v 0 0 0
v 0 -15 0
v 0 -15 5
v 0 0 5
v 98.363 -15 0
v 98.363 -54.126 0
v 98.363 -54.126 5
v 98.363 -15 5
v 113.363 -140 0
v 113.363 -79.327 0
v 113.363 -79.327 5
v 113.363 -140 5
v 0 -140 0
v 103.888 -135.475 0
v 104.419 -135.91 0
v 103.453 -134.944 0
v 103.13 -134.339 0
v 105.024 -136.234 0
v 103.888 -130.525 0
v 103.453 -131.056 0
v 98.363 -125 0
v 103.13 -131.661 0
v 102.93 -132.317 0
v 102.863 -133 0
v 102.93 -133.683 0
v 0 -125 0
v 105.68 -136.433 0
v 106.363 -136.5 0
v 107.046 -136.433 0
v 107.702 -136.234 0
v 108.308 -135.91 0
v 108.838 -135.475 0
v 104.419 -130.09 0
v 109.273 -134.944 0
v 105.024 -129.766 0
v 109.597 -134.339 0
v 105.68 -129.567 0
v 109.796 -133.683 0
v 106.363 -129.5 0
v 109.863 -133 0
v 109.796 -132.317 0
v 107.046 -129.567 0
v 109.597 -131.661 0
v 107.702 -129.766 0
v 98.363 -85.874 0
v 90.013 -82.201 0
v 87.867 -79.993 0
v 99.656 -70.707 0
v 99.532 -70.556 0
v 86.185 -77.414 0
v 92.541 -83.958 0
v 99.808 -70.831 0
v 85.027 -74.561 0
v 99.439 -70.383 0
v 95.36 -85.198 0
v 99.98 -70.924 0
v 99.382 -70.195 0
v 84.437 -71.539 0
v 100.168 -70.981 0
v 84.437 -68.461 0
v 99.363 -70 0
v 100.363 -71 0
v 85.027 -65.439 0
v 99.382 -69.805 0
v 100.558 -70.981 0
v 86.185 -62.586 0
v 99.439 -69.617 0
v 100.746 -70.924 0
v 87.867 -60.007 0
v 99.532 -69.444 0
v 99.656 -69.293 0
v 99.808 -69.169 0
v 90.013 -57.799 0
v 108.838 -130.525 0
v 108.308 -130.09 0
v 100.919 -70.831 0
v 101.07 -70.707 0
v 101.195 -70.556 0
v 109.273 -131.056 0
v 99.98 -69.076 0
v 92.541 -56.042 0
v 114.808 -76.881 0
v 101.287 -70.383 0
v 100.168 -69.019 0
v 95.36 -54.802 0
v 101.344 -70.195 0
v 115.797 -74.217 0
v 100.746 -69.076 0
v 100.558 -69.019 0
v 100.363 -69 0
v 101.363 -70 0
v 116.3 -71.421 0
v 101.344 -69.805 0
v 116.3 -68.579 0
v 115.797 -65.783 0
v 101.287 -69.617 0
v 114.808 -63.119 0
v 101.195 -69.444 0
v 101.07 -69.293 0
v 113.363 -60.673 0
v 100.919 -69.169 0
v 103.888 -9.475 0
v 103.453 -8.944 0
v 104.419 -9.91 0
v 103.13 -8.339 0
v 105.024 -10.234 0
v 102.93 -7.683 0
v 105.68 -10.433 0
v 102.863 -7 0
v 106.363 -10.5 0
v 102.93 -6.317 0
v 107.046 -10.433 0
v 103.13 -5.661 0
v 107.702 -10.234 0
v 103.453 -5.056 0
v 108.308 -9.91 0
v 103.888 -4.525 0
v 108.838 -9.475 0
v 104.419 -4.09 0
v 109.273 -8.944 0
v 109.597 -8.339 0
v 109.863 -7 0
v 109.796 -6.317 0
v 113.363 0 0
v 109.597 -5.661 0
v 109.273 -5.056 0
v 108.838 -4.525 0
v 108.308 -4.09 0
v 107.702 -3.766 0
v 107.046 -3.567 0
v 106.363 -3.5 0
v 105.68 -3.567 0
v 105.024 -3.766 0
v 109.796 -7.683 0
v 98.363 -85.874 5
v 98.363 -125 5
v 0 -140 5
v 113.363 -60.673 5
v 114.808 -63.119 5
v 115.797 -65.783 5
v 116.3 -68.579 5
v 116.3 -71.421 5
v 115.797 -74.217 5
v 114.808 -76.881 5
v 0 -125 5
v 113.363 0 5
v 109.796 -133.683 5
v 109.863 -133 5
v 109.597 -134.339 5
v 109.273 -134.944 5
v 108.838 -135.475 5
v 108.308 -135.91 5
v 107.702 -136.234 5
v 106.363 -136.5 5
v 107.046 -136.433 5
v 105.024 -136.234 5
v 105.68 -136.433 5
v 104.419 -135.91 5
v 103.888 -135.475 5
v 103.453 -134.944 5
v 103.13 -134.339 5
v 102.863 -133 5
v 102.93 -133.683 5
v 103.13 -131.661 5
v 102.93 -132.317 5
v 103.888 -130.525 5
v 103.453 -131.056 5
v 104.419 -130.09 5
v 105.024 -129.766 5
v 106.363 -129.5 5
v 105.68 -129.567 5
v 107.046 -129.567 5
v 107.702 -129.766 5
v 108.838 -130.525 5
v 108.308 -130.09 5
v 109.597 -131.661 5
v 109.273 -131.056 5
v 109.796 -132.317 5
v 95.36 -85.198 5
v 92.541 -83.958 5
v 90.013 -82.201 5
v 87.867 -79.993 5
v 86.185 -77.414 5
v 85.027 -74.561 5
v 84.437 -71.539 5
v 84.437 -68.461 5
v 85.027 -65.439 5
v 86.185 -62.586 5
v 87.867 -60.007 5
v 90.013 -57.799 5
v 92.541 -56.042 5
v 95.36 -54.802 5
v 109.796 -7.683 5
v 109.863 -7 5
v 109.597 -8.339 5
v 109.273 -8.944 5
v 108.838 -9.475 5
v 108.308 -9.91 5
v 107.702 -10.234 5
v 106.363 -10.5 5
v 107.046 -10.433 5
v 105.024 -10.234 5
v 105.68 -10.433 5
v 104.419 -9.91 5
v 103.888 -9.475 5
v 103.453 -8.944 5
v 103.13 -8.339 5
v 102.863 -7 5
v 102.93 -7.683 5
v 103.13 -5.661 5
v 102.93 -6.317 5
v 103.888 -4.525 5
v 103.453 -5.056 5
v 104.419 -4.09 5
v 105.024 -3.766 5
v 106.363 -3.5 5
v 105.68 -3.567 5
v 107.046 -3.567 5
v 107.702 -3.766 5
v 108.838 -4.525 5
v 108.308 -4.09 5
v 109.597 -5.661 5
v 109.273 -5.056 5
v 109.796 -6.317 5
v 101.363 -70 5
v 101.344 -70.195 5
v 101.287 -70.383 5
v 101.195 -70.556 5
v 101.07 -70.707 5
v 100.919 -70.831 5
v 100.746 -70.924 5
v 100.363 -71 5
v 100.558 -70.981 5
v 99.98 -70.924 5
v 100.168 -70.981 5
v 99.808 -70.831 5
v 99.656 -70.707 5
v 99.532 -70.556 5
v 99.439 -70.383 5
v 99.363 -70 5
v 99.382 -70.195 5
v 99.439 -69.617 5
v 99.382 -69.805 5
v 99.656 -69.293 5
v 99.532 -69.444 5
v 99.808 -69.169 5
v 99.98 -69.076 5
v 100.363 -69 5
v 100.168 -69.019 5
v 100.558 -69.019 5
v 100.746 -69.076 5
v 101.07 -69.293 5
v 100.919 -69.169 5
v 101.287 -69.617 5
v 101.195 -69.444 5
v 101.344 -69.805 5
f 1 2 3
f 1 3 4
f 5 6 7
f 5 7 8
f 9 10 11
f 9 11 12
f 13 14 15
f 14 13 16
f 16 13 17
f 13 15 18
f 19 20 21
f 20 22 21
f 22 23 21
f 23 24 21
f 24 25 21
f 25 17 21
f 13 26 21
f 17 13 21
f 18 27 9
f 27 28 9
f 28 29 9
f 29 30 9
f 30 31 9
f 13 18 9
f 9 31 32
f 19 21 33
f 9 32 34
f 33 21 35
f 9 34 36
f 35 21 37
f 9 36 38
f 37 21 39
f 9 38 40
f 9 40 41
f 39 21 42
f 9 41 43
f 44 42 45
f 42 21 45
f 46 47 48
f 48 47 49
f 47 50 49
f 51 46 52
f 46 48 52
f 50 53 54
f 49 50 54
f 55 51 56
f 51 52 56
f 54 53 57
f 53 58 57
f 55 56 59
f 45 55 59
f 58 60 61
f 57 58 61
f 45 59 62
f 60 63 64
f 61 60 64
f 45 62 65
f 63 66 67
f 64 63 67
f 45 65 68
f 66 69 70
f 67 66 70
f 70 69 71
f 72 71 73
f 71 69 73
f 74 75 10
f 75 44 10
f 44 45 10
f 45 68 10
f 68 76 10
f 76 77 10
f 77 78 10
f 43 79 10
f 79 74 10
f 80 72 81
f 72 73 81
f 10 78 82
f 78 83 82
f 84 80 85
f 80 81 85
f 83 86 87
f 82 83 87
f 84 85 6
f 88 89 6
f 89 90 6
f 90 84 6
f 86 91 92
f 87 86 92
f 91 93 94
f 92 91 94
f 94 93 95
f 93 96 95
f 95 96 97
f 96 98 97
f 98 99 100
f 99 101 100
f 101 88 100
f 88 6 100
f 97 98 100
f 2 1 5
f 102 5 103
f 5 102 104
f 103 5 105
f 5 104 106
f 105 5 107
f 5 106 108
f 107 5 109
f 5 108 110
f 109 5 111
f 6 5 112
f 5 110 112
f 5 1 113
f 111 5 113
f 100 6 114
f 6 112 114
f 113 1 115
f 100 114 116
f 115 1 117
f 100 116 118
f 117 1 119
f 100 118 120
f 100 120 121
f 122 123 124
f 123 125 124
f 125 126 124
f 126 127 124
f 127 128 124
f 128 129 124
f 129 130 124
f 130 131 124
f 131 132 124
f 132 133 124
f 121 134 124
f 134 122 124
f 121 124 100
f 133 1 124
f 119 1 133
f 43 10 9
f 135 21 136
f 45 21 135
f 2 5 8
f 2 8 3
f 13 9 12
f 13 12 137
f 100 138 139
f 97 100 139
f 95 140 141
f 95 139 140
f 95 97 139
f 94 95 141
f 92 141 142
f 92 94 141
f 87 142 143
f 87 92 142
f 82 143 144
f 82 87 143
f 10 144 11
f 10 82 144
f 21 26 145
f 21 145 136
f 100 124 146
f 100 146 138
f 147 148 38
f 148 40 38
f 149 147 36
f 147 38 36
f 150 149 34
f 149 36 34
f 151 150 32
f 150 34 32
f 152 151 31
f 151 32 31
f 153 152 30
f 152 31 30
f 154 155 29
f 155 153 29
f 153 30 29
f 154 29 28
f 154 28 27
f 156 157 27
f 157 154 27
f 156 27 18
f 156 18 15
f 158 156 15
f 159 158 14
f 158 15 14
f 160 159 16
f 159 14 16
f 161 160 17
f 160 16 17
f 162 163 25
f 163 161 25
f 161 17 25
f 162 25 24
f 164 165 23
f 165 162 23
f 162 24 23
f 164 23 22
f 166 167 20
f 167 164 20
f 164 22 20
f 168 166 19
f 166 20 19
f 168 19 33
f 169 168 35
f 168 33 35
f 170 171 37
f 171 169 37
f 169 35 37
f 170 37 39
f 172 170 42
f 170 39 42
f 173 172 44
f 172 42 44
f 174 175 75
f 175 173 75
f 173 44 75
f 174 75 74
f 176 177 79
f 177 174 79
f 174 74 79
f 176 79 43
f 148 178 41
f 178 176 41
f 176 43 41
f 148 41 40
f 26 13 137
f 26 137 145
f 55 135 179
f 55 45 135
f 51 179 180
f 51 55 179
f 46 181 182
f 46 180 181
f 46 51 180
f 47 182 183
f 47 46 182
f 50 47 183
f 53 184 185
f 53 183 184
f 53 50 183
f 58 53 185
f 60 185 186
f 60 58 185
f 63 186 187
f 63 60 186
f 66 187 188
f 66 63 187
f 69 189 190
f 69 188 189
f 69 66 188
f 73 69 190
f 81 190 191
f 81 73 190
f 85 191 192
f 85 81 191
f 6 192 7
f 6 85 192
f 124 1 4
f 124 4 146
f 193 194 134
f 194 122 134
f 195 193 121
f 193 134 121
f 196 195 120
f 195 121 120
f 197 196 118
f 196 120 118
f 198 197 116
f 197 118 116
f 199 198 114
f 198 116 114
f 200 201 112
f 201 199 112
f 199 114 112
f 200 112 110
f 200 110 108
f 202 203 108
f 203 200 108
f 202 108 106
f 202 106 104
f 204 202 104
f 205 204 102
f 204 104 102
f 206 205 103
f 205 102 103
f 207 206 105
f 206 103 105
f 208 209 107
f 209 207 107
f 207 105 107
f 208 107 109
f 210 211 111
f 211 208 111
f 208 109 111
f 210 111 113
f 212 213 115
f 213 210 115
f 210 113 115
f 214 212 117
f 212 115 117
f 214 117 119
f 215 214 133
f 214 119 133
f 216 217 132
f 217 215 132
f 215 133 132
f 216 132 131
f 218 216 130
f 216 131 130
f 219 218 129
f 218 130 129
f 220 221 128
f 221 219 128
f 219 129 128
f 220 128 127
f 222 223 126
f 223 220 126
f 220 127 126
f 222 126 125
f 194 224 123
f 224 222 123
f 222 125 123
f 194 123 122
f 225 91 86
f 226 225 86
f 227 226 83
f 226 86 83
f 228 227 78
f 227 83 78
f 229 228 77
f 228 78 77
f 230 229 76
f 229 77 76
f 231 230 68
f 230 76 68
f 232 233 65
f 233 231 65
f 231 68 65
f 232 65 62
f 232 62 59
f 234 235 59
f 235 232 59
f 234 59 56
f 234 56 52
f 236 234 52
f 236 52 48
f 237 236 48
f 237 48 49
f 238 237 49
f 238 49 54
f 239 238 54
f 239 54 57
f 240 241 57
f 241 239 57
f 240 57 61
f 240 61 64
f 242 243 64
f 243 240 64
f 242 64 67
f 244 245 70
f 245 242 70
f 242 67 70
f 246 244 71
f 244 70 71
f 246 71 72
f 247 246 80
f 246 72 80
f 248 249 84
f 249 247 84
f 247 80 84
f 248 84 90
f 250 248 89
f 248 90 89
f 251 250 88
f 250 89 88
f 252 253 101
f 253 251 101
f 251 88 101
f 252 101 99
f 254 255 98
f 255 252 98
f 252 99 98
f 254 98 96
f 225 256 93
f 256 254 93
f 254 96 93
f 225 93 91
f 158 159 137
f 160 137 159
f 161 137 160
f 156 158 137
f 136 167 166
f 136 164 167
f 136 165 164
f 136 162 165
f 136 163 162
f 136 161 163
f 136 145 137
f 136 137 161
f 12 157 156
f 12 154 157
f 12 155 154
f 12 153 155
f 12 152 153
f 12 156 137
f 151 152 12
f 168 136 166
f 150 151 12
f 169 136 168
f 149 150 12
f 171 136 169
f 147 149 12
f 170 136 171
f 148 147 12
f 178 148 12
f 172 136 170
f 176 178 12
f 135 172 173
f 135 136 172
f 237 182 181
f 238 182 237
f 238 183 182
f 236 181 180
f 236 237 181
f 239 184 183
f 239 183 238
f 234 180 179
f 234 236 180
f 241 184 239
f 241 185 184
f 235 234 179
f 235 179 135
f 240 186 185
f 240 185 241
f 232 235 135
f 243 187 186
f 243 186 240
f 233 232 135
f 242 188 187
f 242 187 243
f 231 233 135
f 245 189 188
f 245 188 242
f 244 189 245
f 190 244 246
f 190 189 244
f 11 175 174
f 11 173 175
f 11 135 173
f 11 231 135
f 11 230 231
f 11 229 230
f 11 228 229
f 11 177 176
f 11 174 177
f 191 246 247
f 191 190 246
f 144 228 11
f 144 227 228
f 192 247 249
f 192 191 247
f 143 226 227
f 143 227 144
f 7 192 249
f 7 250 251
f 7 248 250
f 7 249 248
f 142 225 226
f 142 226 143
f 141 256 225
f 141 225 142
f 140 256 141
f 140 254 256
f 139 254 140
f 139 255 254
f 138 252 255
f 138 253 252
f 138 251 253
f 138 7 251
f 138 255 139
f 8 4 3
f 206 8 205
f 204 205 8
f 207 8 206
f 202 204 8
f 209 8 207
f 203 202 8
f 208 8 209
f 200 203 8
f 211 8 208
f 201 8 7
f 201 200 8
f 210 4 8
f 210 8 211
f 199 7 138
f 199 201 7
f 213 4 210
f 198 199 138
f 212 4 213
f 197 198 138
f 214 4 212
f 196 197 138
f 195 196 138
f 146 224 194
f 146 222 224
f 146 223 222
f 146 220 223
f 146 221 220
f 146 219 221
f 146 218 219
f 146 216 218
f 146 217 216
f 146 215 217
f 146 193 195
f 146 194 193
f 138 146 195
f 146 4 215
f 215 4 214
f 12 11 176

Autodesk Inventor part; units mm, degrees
ref_plane "YZ Plane" through (0, 0, 0) normal (1, 0, 0) x (0, 1, 0)
ref_plane "XZ Plane" through (0, 0, 0) normal (0, 1, 0) x (-1, 0, 0)
ref_plane "XY Plane" through (0, 0, 0) normal (0, 0, 1) x (1, 0, 0)
sketch "Boceto1" plane through (0, 0, 0) normal (0, 0, 1) x (1, 0, 0)
  circle A0 centre (106.3631, -133) radius 3.5
  line L0 (0, -125) -> (98.3631, -125)
  line L1 (98.3631, -125) -> (98.3631, -85.8745)
  line L2 (0, -140) -> (0, -125)
  line L3 (0, 0) -> (113.3631, 0)
  line L4 (113.3631, 0) -> (113.3631, -60.6726)
  line L5 (0, -15) -> (0, 0)
  circle A1 centre (106.3631, -7) radius 3.5
  arc A2 (98.3631, -54.1255) -> (98.3631, -85.8745) centre (100.3631, -70) ccw
  line L6 (113.3631, -79.3274) -> (113.3631, -140)
  line L7 (113.3631, -140) -> (0, -140)
  line L8 (98.3631, -54.1255) -> (98.3631, -15)
  line L9 (98.3631, -15) -> (0, -15)
  arc A3 (113.3631, -79.3274) -> (113.3631, -60.6726) centre (100.3631, -70) ccw
  circle A4 centre (100.3631, -70) radius 1
  point P0 (98.3631, -85.8745)
  point P1 (113.3631, -79.3274)
  point P2 (113.3631, -60.6726)
  dimension "d0" = 2
extrude "Extrusión1" add sketch "Boceto1" along normal blind 5
properties part number "P7"
